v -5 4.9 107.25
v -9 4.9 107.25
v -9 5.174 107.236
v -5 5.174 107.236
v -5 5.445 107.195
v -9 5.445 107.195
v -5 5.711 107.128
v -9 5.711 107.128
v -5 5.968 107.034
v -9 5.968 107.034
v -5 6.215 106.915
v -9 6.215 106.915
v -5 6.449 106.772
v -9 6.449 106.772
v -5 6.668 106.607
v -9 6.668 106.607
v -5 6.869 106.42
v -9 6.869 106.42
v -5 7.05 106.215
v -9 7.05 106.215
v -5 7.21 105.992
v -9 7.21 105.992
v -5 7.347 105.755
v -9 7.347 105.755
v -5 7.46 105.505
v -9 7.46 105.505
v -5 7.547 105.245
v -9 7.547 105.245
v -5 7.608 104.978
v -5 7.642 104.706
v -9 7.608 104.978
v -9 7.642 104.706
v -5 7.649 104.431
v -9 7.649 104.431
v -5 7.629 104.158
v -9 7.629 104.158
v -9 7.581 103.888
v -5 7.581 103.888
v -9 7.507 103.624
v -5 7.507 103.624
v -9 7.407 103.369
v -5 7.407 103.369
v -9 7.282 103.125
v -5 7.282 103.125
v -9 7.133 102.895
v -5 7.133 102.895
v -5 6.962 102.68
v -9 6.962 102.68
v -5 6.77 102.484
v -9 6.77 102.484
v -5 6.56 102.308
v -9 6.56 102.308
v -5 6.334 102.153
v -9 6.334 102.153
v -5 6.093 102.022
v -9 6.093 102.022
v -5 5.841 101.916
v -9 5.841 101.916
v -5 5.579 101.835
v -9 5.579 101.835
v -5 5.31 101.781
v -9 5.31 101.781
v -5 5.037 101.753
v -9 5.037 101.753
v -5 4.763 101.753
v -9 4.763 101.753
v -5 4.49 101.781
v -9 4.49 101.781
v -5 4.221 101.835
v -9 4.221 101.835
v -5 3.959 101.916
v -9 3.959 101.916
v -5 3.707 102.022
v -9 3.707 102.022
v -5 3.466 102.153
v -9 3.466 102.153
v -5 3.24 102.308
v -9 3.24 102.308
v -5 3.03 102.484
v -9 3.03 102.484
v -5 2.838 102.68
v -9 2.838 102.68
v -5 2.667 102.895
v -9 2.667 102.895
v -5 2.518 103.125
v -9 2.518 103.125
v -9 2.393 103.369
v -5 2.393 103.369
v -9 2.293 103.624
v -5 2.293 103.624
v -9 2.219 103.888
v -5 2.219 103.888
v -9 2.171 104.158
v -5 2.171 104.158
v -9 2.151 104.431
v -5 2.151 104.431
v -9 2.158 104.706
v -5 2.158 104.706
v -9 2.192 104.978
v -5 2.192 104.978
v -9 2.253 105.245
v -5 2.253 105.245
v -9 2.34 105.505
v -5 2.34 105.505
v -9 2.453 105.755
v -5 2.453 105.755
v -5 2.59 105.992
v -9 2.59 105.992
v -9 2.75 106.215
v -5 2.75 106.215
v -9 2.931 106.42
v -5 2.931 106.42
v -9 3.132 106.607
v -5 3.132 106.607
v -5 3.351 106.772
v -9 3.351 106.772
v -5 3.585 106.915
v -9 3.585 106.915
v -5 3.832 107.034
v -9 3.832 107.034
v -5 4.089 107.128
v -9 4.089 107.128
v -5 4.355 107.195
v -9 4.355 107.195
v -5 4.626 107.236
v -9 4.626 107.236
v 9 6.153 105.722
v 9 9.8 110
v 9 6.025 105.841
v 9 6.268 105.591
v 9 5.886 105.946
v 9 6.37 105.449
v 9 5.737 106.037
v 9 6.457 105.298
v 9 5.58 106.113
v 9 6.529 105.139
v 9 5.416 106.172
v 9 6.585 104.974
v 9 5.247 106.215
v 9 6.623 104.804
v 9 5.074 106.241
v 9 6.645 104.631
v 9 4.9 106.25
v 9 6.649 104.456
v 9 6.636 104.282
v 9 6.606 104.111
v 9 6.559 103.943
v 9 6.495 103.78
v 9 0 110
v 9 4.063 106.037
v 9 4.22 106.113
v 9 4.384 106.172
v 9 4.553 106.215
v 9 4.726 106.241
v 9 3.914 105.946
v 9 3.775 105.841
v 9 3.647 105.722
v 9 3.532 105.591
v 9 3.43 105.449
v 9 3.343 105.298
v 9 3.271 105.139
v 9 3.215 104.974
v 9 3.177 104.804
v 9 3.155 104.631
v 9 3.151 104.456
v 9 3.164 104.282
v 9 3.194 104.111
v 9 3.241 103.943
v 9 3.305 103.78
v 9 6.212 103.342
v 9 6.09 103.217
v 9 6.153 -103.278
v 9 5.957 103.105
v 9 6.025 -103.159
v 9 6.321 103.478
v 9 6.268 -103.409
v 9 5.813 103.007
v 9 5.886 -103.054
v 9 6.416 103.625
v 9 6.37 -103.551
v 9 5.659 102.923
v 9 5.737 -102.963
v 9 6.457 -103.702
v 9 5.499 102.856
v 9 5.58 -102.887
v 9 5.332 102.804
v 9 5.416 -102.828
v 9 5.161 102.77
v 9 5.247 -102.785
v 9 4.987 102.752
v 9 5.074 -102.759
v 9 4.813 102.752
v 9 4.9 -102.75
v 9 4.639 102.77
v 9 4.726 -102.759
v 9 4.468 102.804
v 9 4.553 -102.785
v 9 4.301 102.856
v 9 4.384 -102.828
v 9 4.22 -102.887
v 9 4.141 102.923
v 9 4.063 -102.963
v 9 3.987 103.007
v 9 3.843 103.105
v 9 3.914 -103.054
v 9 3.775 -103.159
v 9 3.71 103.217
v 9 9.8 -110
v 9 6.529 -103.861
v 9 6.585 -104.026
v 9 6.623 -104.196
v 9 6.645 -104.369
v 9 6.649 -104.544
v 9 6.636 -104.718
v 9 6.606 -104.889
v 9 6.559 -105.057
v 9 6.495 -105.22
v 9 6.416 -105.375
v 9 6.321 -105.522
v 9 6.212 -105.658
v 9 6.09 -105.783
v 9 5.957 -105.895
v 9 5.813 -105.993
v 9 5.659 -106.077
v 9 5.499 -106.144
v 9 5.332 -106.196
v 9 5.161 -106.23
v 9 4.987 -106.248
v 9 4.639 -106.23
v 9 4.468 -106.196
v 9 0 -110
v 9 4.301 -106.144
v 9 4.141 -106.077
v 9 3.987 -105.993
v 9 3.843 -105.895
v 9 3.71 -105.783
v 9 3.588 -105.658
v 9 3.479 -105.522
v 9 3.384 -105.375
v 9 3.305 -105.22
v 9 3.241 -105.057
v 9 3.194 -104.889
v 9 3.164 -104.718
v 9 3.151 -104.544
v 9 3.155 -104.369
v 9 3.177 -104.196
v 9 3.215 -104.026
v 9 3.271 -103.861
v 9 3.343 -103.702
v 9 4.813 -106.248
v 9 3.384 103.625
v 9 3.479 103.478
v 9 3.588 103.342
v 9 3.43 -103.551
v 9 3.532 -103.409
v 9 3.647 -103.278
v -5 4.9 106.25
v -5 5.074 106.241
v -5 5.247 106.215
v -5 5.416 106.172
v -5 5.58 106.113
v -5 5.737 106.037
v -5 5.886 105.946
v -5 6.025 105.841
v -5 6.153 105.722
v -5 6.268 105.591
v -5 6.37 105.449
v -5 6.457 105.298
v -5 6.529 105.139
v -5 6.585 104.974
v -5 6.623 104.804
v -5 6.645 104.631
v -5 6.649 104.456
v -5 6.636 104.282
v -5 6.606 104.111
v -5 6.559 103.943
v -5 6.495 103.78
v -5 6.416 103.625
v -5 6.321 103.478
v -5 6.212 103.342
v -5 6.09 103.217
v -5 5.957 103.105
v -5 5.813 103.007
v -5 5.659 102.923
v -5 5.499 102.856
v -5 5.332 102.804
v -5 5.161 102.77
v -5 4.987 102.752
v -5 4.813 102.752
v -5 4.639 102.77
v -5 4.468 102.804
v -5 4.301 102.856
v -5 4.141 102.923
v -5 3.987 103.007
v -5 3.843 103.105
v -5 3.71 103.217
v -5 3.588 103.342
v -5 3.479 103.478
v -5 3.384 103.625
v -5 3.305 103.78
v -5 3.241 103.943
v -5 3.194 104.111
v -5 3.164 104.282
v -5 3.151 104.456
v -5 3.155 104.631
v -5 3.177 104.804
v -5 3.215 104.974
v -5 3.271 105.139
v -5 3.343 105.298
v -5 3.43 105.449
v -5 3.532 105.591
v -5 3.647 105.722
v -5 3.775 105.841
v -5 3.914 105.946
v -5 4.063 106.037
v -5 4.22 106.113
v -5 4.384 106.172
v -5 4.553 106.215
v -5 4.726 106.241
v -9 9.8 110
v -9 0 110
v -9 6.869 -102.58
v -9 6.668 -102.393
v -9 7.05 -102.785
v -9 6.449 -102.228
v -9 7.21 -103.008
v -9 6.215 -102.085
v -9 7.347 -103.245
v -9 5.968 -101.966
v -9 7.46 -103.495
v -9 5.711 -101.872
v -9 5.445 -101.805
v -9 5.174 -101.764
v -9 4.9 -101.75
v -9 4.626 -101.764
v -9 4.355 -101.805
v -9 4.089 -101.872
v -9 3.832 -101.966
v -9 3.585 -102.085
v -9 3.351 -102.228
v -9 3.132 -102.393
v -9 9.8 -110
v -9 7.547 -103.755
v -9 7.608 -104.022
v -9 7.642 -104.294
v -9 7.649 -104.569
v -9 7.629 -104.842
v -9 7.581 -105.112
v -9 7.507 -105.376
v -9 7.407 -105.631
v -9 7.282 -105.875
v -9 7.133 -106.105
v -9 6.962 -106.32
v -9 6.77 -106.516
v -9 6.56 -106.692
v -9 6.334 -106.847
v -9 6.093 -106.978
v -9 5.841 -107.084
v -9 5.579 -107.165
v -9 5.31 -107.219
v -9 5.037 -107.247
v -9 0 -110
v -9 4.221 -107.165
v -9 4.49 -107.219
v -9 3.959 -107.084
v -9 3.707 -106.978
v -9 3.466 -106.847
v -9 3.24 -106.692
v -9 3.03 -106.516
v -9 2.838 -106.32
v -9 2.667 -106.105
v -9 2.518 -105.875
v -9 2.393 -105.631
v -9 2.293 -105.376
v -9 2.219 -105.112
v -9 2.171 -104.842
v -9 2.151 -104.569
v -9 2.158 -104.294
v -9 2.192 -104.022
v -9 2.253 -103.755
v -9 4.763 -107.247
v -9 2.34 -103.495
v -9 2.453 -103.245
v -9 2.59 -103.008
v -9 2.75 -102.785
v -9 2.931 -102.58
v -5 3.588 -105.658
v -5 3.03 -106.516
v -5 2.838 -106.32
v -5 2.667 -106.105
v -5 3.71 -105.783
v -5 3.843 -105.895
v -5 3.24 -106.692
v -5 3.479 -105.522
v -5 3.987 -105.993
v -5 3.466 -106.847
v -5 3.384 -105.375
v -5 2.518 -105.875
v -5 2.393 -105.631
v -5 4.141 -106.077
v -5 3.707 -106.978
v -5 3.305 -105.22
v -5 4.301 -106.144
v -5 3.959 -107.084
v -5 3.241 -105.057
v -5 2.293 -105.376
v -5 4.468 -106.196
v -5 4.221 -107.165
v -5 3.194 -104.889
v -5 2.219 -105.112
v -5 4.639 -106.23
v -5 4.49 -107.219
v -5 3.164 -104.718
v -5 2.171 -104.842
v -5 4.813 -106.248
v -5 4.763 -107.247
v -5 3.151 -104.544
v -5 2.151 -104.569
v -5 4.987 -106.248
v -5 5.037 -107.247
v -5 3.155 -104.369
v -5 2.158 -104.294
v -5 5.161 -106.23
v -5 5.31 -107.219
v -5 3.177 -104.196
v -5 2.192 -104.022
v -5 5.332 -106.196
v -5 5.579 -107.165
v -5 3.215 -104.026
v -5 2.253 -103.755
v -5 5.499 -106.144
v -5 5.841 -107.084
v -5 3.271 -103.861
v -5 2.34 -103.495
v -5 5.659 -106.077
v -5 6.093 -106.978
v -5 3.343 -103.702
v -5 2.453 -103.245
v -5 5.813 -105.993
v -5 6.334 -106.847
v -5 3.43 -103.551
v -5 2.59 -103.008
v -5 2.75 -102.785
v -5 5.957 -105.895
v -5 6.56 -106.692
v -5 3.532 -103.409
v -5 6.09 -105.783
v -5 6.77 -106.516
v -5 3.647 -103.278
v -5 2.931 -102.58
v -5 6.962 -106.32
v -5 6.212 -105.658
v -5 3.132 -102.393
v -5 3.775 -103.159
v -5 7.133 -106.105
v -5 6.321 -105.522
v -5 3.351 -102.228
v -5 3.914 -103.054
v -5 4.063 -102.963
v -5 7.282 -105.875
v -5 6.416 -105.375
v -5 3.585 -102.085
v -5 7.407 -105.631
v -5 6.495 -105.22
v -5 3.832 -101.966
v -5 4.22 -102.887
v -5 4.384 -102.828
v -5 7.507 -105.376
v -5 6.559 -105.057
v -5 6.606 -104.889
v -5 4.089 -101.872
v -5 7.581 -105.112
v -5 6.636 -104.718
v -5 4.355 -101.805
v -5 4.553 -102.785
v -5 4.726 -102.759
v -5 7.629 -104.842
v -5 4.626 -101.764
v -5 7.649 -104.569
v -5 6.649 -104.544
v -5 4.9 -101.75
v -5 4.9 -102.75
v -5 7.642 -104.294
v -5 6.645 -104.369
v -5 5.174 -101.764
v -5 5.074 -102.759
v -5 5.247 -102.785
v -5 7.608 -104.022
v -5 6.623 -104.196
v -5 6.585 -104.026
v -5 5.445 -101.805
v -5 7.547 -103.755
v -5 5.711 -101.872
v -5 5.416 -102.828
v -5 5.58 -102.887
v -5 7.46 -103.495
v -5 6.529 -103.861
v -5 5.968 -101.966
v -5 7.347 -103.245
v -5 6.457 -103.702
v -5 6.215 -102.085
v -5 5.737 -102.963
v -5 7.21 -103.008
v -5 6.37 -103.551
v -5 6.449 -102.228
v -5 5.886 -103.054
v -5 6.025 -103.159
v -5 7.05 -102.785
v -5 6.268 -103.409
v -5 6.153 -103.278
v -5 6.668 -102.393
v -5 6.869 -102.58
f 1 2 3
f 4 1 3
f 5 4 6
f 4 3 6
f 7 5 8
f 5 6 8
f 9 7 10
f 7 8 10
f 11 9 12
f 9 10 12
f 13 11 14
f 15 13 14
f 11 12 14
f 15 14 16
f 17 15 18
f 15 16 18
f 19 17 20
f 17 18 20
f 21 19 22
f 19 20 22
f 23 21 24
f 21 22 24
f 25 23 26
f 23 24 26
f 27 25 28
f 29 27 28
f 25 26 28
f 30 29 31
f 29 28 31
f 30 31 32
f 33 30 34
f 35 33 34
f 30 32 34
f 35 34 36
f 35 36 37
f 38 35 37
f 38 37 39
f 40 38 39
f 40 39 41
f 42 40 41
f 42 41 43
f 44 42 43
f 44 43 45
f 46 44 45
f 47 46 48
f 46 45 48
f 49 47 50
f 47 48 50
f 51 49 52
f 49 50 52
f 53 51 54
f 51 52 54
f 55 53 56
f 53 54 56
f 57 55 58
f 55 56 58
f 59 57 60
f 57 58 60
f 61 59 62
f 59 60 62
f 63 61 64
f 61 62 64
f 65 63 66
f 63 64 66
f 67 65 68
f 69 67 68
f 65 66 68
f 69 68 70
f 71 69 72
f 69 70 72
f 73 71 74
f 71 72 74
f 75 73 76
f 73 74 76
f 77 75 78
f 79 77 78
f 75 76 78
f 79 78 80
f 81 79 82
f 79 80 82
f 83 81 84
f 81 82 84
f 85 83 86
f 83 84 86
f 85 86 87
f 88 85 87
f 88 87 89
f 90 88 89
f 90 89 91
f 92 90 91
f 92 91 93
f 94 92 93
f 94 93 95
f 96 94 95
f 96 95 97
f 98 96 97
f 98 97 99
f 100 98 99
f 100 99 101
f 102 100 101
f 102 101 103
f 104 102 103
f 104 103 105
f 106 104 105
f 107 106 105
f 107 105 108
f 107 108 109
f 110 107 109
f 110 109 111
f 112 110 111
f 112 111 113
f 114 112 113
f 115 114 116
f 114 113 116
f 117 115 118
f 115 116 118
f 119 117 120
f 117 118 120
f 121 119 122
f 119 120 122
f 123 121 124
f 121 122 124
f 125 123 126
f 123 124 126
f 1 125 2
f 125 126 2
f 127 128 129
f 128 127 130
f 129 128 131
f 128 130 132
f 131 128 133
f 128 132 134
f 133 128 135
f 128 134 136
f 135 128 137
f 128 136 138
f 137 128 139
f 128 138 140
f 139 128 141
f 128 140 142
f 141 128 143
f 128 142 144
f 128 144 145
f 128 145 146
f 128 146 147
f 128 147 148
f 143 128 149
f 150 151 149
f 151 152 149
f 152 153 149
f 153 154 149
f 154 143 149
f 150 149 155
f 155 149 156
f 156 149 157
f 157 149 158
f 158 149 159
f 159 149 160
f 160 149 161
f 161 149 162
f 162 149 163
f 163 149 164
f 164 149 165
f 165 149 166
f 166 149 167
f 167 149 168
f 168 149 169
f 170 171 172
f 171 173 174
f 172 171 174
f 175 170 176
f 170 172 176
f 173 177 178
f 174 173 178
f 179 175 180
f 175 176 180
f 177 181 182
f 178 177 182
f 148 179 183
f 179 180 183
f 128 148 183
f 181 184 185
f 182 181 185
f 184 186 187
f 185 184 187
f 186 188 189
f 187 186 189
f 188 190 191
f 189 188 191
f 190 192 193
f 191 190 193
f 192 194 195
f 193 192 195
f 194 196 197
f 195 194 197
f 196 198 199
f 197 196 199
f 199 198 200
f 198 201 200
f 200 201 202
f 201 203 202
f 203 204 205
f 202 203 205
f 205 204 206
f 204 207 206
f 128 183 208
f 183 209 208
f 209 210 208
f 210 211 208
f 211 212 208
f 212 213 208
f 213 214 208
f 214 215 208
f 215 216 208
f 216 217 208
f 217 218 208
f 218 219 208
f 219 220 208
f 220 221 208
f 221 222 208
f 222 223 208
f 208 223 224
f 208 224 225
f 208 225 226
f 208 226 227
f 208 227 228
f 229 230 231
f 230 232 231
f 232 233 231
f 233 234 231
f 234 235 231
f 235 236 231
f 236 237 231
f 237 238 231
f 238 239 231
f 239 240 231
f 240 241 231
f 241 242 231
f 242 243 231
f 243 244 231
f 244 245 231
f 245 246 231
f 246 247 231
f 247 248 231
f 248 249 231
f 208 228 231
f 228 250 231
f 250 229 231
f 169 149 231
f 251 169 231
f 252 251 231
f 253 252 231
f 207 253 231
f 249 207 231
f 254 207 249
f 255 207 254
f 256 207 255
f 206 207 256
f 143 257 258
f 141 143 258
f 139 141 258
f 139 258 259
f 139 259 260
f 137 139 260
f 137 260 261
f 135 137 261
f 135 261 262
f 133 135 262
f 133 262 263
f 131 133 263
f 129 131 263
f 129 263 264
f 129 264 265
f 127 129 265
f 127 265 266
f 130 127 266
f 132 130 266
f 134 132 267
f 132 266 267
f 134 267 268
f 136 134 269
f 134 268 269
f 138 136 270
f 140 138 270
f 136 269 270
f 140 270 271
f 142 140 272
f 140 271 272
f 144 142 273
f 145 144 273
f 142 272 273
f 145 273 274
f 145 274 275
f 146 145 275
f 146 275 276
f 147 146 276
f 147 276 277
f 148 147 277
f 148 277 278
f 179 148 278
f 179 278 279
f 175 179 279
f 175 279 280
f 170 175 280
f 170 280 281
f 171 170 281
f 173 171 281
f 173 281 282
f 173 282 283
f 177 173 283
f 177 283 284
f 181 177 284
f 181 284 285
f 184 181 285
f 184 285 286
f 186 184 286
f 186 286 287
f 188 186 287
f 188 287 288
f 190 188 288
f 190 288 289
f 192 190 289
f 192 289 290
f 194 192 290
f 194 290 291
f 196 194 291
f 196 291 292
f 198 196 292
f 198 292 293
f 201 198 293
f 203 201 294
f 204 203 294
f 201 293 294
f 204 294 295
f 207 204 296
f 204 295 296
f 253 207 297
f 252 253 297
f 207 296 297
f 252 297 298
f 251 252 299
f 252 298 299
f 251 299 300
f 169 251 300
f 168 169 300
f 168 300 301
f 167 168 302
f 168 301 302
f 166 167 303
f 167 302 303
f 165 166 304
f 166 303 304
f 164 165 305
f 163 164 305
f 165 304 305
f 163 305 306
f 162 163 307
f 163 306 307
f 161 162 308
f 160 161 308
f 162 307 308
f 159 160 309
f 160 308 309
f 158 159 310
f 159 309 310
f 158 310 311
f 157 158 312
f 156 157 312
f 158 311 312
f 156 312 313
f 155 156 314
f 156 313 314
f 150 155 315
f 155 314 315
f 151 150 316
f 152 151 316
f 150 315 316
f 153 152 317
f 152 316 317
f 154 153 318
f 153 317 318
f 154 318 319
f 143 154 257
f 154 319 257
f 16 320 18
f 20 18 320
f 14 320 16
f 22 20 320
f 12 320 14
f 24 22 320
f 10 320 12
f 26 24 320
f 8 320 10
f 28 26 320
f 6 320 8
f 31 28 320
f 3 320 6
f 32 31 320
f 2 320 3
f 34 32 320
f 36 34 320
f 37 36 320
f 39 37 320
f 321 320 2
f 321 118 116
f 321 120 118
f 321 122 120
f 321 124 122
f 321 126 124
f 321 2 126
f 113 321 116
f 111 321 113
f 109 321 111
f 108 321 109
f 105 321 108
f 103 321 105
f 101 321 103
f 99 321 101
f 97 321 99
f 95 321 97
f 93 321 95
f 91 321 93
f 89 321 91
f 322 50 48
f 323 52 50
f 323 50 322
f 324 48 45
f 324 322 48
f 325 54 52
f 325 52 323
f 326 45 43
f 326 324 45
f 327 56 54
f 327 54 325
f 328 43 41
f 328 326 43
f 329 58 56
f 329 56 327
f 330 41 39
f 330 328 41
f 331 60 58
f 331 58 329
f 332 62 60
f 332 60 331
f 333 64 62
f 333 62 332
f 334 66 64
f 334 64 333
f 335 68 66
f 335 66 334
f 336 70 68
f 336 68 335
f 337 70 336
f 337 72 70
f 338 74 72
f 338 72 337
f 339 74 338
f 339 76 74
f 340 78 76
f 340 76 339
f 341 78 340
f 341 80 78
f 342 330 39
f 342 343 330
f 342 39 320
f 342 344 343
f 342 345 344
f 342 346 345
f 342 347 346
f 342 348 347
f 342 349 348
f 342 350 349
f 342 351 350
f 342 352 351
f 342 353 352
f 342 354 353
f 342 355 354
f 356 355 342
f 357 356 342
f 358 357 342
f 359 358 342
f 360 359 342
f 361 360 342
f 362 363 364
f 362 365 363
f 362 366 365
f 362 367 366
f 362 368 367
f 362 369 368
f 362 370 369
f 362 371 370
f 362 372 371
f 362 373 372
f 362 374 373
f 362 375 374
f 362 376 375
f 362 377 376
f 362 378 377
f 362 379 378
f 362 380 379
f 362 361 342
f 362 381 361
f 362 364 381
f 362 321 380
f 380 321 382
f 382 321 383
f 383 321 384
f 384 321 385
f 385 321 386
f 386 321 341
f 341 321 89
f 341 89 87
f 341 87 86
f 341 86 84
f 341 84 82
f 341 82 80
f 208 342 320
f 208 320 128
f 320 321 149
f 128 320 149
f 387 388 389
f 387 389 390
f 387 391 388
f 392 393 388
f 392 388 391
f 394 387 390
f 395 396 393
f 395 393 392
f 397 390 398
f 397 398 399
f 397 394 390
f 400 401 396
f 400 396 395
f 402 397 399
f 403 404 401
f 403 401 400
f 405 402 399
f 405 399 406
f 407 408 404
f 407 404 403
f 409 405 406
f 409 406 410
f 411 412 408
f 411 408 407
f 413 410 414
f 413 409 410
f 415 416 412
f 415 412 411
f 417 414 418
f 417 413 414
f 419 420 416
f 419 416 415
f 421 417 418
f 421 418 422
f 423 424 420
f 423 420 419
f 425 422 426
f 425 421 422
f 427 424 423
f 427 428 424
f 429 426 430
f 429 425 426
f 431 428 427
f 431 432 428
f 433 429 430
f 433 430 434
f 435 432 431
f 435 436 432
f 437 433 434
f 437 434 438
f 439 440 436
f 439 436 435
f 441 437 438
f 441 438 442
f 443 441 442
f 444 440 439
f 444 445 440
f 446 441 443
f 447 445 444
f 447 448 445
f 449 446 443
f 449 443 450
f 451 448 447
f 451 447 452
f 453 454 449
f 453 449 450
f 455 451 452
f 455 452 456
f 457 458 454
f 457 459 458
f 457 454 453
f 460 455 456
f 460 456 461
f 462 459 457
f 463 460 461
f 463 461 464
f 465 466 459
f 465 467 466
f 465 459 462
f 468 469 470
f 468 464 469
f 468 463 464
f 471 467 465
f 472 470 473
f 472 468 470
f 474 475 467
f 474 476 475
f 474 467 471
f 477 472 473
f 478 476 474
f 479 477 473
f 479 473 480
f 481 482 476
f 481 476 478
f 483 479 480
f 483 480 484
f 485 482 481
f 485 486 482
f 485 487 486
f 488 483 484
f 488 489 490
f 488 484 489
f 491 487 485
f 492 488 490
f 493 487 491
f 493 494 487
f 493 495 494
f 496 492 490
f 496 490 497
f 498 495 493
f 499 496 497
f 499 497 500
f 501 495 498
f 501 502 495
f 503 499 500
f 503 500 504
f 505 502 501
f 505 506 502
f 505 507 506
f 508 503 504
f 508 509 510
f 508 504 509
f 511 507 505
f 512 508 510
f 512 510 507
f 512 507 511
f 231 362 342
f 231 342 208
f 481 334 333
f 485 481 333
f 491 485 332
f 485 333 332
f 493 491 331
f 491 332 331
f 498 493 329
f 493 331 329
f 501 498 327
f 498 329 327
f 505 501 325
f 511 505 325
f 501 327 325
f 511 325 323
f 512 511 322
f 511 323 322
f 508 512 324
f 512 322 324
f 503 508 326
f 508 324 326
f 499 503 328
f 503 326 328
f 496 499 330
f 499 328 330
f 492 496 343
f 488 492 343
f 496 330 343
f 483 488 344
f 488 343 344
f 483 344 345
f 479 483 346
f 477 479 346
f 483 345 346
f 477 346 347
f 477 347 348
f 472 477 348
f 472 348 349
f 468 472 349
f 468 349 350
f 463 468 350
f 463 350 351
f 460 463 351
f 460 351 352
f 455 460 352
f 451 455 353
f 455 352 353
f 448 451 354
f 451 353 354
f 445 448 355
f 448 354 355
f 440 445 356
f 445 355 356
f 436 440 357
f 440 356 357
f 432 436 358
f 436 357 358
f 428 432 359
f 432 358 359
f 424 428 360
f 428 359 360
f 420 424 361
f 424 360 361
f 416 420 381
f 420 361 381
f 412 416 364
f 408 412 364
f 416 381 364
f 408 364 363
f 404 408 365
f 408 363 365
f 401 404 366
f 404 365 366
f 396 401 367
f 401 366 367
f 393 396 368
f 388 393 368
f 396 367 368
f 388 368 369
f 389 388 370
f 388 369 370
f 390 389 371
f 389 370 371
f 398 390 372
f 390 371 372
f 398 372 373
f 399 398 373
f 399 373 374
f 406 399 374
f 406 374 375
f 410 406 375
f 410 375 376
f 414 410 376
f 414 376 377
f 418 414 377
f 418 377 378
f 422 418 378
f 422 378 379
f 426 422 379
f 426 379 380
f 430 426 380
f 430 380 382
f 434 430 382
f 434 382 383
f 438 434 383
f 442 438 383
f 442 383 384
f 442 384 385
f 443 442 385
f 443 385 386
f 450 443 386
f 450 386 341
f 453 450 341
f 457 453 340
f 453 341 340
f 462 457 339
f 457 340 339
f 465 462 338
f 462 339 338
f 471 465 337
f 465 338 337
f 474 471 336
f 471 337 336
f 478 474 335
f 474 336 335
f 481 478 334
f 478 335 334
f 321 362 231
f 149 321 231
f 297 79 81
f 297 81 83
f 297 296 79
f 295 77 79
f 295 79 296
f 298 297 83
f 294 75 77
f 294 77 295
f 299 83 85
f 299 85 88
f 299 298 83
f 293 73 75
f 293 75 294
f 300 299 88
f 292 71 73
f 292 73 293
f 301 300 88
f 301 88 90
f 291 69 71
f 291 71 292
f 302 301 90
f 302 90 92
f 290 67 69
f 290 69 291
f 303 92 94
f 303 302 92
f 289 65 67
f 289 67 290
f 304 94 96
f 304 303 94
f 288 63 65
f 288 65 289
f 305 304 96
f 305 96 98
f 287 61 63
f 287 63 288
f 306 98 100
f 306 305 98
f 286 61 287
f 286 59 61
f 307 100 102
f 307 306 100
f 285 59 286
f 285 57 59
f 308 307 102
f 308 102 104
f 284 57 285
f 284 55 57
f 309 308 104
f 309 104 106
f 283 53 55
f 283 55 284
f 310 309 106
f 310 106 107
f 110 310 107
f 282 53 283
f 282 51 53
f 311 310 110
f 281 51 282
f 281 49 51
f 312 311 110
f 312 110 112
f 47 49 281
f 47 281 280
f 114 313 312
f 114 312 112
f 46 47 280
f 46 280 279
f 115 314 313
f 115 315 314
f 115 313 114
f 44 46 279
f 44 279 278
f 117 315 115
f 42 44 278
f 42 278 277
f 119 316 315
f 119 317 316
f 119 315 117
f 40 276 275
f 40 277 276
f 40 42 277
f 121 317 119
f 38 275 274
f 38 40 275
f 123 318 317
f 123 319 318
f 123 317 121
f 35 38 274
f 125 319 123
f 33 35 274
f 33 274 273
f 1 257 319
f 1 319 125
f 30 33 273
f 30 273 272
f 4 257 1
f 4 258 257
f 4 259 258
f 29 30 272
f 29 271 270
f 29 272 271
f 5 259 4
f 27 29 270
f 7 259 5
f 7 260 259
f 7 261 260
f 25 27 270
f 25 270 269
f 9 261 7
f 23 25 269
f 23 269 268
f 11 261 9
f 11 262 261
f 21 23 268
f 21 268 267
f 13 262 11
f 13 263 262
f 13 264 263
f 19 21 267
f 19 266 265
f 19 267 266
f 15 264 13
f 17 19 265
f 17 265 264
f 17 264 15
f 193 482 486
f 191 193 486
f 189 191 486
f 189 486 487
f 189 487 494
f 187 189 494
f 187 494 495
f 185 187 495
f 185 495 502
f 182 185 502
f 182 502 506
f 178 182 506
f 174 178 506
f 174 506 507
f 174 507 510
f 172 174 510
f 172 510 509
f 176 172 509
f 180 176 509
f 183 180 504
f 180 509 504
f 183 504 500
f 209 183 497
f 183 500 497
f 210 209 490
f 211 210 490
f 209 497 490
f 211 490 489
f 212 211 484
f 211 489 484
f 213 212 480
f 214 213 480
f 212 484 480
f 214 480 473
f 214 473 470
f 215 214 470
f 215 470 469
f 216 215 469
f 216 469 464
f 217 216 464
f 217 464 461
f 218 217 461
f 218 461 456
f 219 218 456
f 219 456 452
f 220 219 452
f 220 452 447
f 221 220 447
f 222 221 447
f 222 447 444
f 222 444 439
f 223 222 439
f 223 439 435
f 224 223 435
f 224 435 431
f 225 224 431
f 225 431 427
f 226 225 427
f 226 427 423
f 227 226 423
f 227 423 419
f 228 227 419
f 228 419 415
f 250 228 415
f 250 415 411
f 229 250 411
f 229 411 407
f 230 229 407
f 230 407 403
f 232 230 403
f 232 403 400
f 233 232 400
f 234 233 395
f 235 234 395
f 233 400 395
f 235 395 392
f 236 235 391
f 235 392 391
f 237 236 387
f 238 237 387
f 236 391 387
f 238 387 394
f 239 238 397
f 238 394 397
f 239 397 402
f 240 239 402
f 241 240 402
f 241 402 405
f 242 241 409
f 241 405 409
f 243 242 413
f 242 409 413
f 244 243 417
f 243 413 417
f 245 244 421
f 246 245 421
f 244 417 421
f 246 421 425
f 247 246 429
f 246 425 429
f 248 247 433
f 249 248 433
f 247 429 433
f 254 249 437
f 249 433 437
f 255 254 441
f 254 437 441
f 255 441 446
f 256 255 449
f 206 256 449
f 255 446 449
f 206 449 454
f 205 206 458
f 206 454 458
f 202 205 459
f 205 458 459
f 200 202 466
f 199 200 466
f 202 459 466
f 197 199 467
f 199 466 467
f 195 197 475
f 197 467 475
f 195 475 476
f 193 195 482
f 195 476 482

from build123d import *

# Parameters (mm, degrees)
SKETCH1_W           = 18
SKETCH1_H           = 220
BOSS_EXTRUDE1_DEPTH = 9.8
SKETCH3_R           = 1.75
CUT_EXTRUDE1_DEPTH  = 35
SKETCH4_R           = 2.75
CUT_EXTRUDE2_DEPTH  = 4


with BuildPart() as part:
    # Sketch1 → Boss-Extrude1 (new body)
    with BuildSketch(Plane(origin=(0, 0, 0), x_dir=(1, 0, 0), z_dir=(0, 1, 0))):
        Rectangle(SKETCH1_W, SKETCH1_H)
    extrude(amount=BOSS_EXTRUDE1_DEPTH)

    # Sketch3 → Cut-Extrude1 (cut)
    with BuildSketch(Plane.ZY.offset(9)):
        with Locations((-104.5, 4.9)):
            Circle(SKETCH3_R)
        with Locations((104.5, 4.9)):
            Circle(SKETCH3_R)
    extrude(amount=-CUT_EXTRUDE1_DEPTH, mode=Mode.SUBTRACT)

    # Sketch4 → Cut-Extrude2 (cut)
    with BuildSketch(Plane.ZY.offset(9)):
        with Locations((-104.5, 4.9)):
            Circle(SKETCH4_R)
        with Locations((104.5, 4.9)):
            Circle(SKETCH4_R)
    extrude(amount=-CUT_EXTRUDE2_DEPTH, mode=Mode.SUBTRACT)


solid = part.part
